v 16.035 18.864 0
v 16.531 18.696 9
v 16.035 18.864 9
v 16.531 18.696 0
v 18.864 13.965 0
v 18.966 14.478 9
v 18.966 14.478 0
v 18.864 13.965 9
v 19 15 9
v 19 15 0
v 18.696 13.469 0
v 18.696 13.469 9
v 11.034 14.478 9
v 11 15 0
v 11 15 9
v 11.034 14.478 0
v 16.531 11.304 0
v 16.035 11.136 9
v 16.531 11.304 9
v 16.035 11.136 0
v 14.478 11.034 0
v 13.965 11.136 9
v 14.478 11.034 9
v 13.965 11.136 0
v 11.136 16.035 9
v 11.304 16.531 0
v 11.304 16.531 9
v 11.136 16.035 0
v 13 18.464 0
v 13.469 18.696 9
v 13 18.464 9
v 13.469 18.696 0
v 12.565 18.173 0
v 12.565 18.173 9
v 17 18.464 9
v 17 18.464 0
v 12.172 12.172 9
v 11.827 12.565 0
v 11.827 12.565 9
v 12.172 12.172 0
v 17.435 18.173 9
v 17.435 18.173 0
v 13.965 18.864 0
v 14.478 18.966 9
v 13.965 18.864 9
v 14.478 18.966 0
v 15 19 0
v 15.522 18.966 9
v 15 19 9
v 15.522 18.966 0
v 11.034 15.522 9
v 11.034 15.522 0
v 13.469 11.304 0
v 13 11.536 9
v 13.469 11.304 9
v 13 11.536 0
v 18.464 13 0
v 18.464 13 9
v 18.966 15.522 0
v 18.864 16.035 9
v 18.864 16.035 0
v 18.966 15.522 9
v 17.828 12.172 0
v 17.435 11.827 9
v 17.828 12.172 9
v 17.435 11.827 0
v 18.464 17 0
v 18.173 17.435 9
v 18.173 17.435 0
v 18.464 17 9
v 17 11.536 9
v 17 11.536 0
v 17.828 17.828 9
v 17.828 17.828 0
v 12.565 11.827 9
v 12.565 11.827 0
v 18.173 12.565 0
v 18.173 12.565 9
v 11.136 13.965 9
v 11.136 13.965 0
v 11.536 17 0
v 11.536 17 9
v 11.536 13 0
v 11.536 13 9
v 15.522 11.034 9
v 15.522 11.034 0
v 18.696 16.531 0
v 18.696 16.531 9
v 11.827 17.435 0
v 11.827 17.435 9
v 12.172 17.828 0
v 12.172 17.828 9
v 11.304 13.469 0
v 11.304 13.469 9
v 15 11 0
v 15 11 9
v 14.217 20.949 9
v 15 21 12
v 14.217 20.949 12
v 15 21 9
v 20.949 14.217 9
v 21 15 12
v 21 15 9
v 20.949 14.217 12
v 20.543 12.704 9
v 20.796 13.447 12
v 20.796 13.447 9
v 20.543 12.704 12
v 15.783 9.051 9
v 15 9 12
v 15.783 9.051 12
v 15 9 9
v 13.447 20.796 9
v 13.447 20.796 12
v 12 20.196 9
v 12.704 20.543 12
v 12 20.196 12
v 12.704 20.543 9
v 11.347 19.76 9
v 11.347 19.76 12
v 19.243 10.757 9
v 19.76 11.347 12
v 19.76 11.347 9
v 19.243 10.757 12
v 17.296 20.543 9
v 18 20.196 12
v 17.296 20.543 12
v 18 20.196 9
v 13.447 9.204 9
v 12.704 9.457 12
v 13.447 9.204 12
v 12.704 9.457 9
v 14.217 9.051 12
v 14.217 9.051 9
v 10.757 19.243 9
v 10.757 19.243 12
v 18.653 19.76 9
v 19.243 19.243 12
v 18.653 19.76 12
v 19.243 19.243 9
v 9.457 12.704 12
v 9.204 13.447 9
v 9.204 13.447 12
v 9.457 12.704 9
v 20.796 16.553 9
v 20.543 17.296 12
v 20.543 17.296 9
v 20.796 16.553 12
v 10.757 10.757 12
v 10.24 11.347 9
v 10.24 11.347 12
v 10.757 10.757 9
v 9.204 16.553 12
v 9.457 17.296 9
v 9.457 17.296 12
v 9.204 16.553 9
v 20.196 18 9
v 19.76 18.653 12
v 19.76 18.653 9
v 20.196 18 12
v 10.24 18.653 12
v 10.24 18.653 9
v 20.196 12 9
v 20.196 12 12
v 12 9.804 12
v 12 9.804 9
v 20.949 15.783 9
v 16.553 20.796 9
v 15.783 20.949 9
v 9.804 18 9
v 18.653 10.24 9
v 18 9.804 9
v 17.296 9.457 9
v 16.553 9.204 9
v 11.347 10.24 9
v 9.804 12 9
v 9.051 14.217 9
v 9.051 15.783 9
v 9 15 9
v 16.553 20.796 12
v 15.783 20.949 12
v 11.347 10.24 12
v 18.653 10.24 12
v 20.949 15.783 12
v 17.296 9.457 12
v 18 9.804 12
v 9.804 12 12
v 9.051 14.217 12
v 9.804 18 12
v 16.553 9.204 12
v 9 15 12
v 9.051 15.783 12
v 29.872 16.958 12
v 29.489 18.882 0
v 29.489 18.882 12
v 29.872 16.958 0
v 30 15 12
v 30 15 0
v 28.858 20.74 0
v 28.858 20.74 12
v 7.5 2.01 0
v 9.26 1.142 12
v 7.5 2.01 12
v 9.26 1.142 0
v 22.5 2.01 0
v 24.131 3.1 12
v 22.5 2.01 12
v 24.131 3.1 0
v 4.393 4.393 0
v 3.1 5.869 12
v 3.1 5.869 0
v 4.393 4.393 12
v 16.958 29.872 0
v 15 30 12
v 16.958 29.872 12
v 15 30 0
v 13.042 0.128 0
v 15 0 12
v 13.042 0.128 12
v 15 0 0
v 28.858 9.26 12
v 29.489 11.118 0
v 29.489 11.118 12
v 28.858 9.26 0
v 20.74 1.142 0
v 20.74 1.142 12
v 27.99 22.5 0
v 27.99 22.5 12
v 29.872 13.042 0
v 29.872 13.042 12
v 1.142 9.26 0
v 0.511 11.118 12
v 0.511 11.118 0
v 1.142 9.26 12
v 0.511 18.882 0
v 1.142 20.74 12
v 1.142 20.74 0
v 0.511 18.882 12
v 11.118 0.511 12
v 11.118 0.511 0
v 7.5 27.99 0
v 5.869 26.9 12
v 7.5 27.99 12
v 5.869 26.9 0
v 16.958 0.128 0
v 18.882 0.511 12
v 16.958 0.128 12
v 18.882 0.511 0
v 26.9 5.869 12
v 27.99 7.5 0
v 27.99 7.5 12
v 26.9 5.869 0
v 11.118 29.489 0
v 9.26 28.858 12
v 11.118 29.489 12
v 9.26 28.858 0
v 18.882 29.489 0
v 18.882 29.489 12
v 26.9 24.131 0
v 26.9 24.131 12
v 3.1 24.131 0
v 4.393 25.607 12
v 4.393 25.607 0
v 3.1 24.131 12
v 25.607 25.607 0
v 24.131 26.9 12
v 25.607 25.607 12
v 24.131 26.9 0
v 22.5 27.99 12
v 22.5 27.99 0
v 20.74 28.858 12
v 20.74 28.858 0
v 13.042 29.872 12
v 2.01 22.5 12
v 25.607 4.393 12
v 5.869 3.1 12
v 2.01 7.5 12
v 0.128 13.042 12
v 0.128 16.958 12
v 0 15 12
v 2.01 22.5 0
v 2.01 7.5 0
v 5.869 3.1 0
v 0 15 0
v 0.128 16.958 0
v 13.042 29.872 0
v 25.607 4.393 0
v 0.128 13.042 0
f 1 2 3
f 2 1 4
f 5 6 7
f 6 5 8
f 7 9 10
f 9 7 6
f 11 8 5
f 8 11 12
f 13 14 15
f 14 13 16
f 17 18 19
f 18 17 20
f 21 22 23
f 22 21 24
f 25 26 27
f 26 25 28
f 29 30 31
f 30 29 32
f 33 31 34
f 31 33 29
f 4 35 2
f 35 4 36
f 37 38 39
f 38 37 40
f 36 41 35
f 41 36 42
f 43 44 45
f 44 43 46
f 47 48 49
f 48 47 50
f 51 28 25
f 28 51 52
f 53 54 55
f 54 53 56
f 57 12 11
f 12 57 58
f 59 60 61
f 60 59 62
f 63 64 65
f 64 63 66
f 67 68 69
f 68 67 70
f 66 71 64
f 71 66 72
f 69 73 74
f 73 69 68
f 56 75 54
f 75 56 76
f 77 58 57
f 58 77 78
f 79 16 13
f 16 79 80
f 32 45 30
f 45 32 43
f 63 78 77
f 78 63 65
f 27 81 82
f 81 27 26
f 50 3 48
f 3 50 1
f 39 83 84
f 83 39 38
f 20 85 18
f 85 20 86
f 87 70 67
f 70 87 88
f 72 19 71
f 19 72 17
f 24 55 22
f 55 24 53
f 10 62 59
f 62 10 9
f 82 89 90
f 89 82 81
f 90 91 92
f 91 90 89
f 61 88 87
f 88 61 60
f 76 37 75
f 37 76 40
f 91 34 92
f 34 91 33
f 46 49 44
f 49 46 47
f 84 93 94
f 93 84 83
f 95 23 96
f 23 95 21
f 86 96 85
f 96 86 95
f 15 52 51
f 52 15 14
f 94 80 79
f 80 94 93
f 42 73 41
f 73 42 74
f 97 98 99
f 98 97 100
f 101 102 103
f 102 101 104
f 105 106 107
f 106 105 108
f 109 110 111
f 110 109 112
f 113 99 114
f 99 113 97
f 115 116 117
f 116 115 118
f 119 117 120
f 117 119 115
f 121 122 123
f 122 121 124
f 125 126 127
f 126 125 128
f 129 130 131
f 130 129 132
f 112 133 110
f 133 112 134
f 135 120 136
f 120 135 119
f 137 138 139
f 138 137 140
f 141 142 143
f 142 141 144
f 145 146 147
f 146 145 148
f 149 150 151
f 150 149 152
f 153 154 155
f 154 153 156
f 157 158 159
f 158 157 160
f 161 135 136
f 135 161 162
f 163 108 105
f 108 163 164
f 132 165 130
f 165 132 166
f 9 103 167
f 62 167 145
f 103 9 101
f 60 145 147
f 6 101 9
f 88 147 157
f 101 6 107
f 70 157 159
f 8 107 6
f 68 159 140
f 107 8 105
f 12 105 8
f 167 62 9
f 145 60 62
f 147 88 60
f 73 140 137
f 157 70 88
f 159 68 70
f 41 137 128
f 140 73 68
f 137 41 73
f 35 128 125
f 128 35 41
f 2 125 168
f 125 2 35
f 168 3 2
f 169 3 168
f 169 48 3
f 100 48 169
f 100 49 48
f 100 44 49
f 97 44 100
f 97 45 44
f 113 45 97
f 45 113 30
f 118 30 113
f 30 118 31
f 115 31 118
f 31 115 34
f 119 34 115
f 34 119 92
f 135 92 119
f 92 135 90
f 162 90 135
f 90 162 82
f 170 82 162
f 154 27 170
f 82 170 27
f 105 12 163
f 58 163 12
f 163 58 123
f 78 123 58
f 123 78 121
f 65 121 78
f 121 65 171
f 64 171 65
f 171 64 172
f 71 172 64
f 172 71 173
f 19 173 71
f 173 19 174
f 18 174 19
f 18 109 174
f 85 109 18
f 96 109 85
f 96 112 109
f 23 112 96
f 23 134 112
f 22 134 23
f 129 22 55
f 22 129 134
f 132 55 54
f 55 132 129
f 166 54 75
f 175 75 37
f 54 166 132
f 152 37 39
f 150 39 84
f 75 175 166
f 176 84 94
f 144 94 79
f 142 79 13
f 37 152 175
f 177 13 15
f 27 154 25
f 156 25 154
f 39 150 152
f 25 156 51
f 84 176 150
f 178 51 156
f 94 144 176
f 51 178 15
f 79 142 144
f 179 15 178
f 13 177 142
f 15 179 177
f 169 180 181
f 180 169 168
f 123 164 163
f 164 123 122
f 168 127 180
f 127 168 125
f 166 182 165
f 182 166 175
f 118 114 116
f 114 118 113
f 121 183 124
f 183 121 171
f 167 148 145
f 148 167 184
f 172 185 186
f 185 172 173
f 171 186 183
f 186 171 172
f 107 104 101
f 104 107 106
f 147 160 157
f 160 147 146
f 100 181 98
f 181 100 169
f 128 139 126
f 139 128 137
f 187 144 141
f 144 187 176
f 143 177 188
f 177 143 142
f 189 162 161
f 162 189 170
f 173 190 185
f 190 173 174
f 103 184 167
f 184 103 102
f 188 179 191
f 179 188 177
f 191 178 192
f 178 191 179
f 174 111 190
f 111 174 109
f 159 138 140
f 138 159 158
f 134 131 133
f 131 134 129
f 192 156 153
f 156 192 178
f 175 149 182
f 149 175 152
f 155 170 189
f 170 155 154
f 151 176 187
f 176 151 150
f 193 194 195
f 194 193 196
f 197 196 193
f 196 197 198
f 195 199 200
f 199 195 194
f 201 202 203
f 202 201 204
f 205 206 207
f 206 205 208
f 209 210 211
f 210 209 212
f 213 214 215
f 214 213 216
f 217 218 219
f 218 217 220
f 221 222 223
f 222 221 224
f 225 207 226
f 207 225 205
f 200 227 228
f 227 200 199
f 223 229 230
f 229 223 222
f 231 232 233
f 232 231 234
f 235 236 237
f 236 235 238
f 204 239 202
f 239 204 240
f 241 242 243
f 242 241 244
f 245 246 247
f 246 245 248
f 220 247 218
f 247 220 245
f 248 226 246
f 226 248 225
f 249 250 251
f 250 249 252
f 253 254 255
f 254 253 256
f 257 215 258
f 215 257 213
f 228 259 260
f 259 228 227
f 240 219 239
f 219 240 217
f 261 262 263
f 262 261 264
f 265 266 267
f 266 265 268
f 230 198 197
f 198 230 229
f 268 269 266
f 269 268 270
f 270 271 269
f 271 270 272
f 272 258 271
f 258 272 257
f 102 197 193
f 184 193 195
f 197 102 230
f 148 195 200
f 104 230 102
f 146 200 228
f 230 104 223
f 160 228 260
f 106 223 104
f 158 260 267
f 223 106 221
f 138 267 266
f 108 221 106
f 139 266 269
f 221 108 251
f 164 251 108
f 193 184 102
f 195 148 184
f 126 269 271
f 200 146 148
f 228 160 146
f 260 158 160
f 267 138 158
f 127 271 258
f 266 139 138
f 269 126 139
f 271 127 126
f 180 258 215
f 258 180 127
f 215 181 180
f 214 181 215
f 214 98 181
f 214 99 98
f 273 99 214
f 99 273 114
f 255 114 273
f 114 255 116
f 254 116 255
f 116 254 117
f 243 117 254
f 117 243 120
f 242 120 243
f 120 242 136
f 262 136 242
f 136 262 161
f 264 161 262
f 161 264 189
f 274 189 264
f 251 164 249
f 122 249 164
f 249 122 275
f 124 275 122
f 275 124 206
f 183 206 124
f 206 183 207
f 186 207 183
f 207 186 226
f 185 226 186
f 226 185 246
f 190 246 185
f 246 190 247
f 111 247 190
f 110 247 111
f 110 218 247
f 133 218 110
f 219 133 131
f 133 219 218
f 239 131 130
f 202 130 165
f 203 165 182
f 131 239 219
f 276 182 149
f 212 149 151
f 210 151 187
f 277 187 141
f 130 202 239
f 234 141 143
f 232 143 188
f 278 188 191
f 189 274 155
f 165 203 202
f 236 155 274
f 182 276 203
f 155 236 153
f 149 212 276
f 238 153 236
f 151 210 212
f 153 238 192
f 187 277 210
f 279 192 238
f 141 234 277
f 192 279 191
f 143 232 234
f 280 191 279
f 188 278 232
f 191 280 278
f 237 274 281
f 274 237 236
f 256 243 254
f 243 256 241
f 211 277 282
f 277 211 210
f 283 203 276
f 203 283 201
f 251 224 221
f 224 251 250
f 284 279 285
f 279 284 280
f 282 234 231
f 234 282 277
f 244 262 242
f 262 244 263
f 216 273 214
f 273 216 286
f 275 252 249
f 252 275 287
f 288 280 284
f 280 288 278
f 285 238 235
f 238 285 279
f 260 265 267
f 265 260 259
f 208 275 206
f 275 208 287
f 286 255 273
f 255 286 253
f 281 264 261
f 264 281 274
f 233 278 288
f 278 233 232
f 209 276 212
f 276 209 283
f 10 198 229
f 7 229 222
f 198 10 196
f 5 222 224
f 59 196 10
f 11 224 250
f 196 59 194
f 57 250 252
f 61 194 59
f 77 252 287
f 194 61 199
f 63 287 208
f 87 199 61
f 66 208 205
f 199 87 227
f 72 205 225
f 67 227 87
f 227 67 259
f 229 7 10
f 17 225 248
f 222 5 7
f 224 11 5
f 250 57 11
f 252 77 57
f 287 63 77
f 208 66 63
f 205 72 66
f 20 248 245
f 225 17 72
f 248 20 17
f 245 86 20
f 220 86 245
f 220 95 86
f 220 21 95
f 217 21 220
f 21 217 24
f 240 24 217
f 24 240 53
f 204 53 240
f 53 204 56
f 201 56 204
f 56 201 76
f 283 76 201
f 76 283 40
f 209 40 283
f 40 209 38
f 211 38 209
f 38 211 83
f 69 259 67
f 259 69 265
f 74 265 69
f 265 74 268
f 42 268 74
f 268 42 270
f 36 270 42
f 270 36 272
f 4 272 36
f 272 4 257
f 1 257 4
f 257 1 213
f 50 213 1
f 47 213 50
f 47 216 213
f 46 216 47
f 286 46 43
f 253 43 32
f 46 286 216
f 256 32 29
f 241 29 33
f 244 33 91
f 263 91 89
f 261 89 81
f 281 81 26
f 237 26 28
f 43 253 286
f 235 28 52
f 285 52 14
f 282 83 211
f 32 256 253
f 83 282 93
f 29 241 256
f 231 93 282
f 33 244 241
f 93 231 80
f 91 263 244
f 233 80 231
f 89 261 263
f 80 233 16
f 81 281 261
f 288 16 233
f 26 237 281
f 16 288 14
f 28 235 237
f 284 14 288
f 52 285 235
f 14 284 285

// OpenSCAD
// units=mm — generated by scad_emitter.py
// part=unnamed
$fn = 48;

difference() { translate([15, 15, 0]) cylinder(h=12, r=15, $fn=$fn); union() { translate([15, 15, 12.5]) rotate([180, 0, 0]) cylinder(h=13, r=4, $fn=$fn); translate([15, 15, 12.5]) rotate([180, 0, 0]) cylinder(h=3.5, r=6, $fn=$fn); } }
